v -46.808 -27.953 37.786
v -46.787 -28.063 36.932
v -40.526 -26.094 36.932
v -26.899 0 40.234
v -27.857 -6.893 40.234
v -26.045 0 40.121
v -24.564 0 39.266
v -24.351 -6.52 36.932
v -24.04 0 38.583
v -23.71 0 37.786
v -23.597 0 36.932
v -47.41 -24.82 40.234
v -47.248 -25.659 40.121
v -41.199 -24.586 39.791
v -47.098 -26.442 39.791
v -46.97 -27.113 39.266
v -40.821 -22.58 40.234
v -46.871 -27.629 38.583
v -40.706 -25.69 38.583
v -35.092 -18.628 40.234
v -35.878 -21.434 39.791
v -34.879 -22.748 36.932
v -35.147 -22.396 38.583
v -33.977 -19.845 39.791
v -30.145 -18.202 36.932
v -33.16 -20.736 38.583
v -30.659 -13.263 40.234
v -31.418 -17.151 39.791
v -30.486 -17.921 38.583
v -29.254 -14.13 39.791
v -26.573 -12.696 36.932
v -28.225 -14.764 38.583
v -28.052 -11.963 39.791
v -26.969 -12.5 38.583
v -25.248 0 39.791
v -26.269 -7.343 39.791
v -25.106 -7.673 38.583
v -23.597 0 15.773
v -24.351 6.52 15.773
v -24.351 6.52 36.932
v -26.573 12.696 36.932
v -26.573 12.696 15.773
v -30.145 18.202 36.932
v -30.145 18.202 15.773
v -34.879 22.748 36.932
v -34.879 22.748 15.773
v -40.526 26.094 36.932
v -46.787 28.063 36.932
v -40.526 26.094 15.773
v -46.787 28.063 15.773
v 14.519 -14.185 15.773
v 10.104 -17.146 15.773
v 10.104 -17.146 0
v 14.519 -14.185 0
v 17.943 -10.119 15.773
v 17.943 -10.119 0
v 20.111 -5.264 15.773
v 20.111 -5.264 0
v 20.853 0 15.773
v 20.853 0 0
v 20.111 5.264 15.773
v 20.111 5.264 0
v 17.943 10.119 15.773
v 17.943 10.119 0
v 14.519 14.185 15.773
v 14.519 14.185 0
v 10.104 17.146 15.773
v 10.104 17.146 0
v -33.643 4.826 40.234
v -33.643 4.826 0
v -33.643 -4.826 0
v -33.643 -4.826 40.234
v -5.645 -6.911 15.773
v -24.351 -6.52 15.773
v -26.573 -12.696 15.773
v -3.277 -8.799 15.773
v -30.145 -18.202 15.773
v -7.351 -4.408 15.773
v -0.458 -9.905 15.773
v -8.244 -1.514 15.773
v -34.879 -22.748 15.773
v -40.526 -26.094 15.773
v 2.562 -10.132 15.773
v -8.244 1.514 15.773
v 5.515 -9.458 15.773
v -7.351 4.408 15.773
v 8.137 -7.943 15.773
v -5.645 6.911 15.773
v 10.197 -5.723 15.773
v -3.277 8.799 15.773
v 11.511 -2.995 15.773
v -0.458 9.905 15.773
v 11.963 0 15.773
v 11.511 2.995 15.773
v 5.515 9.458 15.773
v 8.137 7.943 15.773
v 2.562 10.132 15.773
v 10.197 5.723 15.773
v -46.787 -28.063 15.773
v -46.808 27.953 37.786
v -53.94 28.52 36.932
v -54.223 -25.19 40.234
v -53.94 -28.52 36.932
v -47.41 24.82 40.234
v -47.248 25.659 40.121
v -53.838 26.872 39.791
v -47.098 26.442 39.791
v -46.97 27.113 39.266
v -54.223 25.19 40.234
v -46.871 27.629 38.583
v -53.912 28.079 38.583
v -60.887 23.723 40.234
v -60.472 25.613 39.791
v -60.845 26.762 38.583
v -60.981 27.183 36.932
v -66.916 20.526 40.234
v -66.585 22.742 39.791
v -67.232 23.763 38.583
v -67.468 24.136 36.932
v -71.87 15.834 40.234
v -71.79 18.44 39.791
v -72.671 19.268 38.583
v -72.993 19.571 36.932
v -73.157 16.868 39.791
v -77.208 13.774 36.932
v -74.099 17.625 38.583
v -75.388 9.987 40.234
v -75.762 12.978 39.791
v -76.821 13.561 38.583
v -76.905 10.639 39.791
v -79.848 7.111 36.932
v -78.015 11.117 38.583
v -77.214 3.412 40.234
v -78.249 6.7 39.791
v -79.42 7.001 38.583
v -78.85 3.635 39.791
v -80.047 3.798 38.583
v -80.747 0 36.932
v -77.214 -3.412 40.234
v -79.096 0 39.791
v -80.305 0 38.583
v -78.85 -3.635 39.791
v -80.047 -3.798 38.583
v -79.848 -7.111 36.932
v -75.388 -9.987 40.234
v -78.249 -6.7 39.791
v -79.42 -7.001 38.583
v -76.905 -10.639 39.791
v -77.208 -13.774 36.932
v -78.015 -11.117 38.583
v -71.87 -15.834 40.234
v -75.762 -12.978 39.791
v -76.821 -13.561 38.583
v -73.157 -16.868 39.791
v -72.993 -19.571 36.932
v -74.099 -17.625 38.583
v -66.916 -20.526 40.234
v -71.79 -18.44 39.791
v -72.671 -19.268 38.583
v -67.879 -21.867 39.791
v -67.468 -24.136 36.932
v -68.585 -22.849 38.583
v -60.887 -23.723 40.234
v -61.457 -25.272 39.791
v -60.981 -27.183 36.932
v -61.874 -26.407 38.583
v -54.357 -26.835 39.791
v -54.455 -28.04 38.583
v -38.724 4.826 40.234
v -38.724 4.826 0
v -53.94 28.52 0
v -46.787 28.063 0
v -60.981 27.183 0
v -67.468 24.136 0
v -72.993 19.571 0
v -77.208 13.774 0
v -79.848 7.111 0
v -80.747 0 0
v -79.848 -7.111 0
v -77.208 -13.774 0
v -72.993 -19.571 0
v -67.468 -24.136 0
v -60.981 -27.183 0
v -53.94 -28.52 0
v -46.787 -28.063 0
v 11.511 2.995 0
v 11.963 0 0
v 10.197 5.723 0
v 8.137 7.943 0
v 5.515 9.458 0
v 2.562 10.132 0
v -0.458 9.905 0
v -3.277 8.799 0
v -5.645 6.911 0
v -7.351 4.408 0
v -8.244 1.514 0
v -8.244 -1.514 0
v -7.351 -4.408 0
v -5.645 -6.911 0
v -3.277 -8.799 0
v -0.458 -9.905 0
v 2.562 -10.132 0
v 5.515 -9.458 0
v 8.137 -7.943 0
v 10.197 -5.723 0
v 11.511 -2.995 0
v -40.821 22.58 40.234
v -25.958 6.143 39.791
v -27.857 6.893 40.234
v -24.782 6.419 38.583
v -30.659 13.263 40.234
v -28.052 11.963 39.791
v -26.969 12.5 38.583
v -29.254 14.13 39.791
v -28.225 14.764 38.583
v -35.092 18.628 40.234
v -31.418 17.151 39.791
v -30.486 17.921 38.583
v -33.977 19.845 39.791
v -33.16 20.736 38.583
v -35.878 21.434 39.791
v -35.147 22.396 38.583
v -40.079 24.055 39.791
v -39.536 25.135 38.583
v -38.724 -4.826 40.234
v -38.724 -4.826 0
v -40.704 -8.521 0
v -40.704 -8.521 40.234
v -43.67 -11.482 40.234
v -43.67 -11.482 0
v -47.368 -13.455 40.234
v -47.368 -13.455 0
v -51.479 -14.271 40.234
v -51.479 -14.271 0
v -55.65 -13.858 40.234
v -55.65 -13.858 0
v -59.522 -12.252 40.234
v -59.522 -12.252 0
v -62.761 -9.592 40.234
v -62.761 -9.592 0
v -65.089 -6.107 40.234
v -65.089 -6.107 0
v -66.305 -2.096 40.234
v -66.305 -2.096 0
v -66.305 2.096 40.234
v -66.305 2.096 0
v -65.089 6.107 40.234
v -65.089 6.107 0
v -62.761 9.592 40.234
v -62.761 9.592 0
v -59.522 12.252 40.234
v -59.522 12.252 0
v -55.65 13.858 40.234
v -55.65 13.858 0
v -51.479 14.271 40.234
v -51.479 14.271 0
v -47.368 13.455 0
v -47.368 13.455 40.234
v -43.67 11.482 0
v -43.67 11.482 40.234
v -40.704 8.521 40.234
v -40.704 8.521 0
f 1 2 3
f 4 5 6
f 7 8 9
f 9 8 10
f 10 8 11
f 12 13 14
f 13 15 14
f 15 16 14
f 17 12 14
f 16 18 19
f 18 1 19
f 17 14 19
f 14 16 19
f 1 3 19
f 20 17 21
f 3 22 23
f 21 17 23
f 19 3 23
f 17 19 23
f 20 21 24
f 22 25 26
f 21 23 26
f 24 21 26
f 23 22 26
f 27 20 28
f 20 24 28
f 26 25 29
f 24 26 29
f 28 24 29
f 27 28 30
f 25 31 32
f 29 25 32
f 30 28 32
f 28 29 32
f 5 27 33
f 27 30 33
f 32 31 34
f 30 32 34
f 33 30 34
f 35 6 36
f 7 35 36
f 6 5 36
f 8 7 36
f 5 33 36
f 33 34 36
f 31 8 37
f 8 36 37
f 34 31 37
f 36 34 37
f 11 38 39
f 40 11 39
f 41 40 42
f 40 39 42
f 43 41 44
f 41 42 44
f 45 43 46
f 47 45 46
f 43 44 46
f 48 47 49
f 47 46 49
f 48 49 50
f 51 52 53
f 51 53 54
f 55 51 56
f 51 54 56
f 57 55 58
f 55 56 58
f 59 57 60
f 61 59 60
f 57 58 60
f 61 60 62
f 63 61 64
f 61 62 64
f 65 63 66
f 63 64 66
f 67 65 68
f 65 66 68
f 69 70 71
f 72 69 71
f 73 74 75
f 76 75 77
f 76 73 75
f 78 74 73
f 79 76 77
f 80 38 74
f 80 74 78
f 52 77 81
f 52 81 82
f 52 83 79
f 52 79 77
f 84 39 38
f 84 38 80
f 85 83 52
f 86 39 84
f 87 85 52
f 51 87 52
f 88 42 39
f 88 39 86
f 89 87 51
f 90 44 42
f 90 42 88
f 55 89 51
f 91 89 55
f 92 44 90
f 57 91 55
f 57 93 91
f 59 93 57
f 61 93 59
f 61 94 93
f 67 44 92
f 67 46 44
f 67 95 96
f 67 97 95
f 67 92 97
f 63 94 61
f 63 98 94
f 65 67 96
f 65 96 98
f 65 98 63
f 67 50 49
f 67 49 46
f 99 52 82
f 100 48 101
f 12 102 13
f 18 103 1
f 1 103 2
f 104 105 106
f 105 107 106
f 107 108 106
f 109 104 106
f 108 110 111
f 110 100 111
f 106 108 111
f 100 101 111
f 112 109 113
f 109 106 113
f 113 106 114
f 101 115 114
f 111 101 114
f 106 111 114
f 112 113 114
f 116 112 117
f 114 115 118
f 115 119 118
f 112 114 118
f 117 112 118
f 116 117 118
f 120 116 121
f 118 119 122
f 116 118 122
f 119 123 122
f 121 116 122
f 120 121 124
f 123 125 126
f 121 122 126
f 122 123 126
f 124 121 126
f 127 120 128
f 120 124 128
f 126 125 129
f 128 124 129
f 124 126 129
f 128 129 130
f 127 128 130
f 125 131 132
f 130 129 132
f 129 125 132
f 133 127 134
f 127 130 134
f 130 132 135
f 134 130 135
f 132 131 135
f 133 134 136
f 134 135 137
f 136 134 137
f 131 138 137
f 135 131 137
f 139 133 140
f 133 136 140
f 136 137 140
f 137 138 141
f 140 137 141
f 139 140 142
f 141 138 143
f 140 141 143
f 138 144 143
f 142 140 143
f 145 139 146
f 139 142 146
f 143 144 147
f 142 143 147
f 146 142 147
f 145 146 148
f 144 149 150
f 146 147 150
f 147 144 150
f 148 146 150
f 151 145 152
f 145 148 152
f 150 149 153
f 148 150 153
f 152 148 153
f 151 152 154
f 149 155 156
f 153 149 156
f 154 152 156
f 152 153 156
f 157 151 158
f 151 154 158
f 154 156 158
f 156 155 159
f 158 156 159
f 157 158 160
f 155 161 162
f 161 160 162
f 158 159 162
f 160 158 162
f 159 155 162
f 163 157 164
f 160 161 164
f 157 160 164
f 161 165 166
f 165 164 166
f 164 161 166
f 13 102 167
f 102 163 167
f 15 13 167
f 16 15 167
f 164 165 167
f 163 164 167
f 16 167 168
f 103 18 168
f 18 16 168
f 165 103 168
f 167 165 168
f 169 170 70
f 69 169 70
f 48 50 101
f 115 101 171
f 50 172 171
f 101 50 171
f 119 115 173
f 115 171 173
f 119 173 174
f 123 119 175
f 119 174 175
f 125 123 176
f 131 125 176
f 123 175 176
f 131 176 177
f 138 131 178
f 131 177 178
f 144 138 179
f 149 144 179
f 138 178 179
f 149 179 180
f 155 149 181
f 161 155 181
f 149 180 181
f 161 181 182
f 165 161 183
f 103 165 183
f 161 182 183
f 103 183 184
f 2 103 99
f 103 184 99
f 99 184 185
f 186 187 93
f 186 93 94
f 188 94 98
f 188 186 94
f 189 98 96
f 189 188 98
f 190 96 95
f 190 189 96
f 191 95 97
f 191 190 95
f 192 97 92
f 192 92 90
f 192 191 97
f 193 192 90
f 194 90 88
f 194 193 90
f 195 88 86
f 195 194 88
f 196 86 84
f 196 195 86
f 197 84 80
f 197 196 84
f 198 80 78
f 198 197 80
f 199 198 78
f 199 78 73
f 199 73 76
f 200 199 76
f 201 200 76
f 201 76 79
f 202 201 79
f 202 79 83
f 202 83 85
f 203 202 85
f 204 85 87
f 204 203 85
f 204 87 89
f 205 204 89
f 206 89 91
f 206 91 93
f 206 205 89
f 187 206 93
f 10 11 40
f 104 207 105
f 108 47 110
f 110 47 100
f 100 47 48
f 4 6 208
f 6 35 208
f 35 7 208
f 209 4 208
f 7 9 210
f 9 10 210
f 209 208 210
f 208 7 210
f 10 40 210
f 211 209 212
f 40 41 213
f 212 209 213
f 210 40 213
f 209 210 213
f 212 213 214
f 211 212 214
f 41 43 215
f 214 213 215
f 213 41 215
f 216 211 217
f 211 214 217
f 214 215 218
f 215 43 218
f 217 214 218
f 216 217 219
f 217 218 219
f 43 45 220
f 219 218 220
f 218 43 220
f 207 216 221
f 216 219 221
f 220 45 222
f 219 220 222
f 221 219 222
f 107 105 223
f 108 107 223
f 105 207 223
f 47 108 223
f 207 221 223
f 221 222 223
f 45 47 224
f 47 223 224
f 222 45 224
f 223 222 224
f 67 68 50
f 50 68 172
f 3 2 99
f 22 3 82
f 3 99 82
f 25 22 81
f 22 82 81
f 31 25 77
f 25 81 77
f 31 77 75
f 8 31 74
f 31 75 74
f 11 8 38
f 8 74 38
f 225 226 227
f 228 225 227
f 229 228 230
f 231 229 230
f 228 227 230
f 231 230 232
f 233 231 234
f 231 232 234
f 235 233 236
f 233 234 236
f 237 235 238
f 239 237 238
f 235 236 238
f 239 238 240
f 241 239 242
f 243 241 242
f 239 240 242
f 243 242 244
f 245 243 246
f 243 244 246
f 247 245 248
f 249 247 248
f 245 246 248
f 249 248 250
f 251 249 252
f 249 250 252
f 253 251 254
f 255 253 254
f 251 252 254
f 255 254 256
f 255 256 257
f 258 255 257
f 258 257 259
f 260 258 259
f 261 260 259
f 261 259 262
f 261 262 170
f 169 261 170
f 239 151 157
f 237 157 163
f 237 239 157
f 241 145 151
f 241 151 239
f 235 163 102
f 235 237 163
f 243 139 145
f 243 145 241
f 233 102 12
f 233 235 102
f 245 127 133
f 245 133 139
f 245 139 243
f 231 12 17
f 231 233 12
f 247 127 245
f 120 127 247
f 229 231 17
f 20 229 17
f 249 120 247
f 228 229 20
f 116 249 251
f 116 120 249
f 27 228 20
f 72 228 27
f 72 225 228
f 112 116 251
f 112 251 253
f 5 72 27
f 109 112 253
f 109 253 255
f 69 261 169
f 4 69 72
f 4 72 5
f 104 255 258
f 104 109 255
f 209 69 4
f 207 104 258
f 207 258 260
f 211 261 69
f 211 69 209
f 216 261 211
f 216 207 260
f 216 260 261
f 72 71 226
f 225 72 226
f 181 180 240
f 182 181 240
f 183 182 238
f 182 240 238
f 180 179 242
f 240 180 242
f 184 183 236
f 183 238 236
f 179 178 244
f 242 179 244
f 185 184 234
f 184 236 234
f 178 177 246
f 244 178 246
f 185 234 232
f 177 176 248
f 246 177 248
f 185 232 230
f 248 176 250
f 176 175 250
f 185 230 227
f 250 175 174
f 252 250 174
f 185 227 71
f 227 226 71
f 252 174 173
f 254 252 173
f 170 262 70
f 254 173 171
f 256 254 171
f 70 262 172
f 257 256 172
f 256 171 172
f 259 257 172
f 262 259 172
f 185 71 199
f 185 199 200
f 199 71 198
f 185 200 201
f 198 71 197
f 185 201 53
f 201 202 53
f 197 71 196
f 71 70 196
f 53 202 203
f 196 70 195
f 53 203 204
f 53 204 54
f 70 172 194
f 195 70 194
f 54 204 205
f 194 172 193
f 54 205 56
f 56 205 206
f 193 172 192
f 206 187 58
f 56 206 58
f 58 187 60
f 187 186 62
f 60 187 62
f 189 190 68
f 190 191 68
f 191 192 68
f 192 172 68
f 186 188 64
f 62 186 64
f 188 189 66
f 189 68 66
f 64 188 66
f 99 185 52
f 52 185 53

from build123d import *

# Parameters (mm, degrees)
F1_DEPTH = 40.2336
F0_R     = 10.16
F2_DEPTH = 15.7734
F3_R     = 3.302


with BuildPart() as f1:
    # F0 (on Top) → F1 (new body)
    with BuildSketch(Plane.XY):
        with BuildLine():
            ThreePointArc((-46.787253, -28.063018), (-30.144883, -18.202414), (-23.597202, 0))
            ThreePointArc((-23.597202, 0), (-30.144883, 18.202414), (-46.787253, 28.063018))
            ThreePointArc((-46.787253, 28.063018), (-80.747202, 0), (-46.787253, -28.063018))
        make_face()
        with BuildLine():
            ThreePointArc((-38.724437, -4.826), (-66.459702, 0), (-38.724437, 4.826))
            Line((-38.724437, 4.826), (-33.642902, 4.826))
            Line((-33.642902, 4.826), (-33.642902, -4.826))
            Line((-33.642902, -4.826), (-38.724437, -4.826))
        make_face(mode=Mode.SUBTRACT)
    extrude(amount=F1_DEPTH)

    # F0 (on Top) → F2 (join)
    with BuildSketch(Plane.XY):
        with BuildLine():
            ThreePointArc((-46.787253, -28.063018), (-30.144883, -18.202414), (-23.597202, 0))
            ThreePointArc((-23.597202, 0), (-30.144883, 18.202414), (-46.787253, 28.063018))
            ThreePointArc((-46.787253, 28.063018), (-80.747202, 0), (-46.787253, -28.063018))
        make_face()
        with BuildLine():
            ThreePointArc((-38.724437, -4.826), (-66.459702, 0), (-38.724437, 4.826))
            Line((-38.724437, 4.826), (-33.642902, 4.826))
            Line((-33.642902, 4.826), (-33.642902, -4.826))
            Line((-33.642902, -4.826), (-38.724437, -4.826))
        make_face(mode=Mode.SUBTRACT)
        with BuildLine():
            ThreePointArc((-46.787253, 28.063018), (-30.144883, 18.202414), (-23.597202, 0))
            ThreePointArc((-23.597202, 0), (-30.144883, -18.202414), (-46.787253, -28.063018))
            Line((-46.787253, -28.063018), (10.103749, -17.146333))
            ThreePointArc((10.103749, -17.146333), (20.852798, 0), (10.103749, 17.146333))
            Line((10.103749, 17.146333), (-46.787253, 28.063018))
        make_face()
        with Locations((1.802798, 0)):
            Circle(F0_R, mode=Mode.SUBTRACT)
    extrude(amount=F2_DEPTH)

    # F3
    f3_edges = [f1.edges().sort_by_distance(p)[0] for p in [
        (-57.55715, 28.063018, 40.2336),
    ]]
    fillet(f3_edges, radius=F3_R)


solid = f1.part
